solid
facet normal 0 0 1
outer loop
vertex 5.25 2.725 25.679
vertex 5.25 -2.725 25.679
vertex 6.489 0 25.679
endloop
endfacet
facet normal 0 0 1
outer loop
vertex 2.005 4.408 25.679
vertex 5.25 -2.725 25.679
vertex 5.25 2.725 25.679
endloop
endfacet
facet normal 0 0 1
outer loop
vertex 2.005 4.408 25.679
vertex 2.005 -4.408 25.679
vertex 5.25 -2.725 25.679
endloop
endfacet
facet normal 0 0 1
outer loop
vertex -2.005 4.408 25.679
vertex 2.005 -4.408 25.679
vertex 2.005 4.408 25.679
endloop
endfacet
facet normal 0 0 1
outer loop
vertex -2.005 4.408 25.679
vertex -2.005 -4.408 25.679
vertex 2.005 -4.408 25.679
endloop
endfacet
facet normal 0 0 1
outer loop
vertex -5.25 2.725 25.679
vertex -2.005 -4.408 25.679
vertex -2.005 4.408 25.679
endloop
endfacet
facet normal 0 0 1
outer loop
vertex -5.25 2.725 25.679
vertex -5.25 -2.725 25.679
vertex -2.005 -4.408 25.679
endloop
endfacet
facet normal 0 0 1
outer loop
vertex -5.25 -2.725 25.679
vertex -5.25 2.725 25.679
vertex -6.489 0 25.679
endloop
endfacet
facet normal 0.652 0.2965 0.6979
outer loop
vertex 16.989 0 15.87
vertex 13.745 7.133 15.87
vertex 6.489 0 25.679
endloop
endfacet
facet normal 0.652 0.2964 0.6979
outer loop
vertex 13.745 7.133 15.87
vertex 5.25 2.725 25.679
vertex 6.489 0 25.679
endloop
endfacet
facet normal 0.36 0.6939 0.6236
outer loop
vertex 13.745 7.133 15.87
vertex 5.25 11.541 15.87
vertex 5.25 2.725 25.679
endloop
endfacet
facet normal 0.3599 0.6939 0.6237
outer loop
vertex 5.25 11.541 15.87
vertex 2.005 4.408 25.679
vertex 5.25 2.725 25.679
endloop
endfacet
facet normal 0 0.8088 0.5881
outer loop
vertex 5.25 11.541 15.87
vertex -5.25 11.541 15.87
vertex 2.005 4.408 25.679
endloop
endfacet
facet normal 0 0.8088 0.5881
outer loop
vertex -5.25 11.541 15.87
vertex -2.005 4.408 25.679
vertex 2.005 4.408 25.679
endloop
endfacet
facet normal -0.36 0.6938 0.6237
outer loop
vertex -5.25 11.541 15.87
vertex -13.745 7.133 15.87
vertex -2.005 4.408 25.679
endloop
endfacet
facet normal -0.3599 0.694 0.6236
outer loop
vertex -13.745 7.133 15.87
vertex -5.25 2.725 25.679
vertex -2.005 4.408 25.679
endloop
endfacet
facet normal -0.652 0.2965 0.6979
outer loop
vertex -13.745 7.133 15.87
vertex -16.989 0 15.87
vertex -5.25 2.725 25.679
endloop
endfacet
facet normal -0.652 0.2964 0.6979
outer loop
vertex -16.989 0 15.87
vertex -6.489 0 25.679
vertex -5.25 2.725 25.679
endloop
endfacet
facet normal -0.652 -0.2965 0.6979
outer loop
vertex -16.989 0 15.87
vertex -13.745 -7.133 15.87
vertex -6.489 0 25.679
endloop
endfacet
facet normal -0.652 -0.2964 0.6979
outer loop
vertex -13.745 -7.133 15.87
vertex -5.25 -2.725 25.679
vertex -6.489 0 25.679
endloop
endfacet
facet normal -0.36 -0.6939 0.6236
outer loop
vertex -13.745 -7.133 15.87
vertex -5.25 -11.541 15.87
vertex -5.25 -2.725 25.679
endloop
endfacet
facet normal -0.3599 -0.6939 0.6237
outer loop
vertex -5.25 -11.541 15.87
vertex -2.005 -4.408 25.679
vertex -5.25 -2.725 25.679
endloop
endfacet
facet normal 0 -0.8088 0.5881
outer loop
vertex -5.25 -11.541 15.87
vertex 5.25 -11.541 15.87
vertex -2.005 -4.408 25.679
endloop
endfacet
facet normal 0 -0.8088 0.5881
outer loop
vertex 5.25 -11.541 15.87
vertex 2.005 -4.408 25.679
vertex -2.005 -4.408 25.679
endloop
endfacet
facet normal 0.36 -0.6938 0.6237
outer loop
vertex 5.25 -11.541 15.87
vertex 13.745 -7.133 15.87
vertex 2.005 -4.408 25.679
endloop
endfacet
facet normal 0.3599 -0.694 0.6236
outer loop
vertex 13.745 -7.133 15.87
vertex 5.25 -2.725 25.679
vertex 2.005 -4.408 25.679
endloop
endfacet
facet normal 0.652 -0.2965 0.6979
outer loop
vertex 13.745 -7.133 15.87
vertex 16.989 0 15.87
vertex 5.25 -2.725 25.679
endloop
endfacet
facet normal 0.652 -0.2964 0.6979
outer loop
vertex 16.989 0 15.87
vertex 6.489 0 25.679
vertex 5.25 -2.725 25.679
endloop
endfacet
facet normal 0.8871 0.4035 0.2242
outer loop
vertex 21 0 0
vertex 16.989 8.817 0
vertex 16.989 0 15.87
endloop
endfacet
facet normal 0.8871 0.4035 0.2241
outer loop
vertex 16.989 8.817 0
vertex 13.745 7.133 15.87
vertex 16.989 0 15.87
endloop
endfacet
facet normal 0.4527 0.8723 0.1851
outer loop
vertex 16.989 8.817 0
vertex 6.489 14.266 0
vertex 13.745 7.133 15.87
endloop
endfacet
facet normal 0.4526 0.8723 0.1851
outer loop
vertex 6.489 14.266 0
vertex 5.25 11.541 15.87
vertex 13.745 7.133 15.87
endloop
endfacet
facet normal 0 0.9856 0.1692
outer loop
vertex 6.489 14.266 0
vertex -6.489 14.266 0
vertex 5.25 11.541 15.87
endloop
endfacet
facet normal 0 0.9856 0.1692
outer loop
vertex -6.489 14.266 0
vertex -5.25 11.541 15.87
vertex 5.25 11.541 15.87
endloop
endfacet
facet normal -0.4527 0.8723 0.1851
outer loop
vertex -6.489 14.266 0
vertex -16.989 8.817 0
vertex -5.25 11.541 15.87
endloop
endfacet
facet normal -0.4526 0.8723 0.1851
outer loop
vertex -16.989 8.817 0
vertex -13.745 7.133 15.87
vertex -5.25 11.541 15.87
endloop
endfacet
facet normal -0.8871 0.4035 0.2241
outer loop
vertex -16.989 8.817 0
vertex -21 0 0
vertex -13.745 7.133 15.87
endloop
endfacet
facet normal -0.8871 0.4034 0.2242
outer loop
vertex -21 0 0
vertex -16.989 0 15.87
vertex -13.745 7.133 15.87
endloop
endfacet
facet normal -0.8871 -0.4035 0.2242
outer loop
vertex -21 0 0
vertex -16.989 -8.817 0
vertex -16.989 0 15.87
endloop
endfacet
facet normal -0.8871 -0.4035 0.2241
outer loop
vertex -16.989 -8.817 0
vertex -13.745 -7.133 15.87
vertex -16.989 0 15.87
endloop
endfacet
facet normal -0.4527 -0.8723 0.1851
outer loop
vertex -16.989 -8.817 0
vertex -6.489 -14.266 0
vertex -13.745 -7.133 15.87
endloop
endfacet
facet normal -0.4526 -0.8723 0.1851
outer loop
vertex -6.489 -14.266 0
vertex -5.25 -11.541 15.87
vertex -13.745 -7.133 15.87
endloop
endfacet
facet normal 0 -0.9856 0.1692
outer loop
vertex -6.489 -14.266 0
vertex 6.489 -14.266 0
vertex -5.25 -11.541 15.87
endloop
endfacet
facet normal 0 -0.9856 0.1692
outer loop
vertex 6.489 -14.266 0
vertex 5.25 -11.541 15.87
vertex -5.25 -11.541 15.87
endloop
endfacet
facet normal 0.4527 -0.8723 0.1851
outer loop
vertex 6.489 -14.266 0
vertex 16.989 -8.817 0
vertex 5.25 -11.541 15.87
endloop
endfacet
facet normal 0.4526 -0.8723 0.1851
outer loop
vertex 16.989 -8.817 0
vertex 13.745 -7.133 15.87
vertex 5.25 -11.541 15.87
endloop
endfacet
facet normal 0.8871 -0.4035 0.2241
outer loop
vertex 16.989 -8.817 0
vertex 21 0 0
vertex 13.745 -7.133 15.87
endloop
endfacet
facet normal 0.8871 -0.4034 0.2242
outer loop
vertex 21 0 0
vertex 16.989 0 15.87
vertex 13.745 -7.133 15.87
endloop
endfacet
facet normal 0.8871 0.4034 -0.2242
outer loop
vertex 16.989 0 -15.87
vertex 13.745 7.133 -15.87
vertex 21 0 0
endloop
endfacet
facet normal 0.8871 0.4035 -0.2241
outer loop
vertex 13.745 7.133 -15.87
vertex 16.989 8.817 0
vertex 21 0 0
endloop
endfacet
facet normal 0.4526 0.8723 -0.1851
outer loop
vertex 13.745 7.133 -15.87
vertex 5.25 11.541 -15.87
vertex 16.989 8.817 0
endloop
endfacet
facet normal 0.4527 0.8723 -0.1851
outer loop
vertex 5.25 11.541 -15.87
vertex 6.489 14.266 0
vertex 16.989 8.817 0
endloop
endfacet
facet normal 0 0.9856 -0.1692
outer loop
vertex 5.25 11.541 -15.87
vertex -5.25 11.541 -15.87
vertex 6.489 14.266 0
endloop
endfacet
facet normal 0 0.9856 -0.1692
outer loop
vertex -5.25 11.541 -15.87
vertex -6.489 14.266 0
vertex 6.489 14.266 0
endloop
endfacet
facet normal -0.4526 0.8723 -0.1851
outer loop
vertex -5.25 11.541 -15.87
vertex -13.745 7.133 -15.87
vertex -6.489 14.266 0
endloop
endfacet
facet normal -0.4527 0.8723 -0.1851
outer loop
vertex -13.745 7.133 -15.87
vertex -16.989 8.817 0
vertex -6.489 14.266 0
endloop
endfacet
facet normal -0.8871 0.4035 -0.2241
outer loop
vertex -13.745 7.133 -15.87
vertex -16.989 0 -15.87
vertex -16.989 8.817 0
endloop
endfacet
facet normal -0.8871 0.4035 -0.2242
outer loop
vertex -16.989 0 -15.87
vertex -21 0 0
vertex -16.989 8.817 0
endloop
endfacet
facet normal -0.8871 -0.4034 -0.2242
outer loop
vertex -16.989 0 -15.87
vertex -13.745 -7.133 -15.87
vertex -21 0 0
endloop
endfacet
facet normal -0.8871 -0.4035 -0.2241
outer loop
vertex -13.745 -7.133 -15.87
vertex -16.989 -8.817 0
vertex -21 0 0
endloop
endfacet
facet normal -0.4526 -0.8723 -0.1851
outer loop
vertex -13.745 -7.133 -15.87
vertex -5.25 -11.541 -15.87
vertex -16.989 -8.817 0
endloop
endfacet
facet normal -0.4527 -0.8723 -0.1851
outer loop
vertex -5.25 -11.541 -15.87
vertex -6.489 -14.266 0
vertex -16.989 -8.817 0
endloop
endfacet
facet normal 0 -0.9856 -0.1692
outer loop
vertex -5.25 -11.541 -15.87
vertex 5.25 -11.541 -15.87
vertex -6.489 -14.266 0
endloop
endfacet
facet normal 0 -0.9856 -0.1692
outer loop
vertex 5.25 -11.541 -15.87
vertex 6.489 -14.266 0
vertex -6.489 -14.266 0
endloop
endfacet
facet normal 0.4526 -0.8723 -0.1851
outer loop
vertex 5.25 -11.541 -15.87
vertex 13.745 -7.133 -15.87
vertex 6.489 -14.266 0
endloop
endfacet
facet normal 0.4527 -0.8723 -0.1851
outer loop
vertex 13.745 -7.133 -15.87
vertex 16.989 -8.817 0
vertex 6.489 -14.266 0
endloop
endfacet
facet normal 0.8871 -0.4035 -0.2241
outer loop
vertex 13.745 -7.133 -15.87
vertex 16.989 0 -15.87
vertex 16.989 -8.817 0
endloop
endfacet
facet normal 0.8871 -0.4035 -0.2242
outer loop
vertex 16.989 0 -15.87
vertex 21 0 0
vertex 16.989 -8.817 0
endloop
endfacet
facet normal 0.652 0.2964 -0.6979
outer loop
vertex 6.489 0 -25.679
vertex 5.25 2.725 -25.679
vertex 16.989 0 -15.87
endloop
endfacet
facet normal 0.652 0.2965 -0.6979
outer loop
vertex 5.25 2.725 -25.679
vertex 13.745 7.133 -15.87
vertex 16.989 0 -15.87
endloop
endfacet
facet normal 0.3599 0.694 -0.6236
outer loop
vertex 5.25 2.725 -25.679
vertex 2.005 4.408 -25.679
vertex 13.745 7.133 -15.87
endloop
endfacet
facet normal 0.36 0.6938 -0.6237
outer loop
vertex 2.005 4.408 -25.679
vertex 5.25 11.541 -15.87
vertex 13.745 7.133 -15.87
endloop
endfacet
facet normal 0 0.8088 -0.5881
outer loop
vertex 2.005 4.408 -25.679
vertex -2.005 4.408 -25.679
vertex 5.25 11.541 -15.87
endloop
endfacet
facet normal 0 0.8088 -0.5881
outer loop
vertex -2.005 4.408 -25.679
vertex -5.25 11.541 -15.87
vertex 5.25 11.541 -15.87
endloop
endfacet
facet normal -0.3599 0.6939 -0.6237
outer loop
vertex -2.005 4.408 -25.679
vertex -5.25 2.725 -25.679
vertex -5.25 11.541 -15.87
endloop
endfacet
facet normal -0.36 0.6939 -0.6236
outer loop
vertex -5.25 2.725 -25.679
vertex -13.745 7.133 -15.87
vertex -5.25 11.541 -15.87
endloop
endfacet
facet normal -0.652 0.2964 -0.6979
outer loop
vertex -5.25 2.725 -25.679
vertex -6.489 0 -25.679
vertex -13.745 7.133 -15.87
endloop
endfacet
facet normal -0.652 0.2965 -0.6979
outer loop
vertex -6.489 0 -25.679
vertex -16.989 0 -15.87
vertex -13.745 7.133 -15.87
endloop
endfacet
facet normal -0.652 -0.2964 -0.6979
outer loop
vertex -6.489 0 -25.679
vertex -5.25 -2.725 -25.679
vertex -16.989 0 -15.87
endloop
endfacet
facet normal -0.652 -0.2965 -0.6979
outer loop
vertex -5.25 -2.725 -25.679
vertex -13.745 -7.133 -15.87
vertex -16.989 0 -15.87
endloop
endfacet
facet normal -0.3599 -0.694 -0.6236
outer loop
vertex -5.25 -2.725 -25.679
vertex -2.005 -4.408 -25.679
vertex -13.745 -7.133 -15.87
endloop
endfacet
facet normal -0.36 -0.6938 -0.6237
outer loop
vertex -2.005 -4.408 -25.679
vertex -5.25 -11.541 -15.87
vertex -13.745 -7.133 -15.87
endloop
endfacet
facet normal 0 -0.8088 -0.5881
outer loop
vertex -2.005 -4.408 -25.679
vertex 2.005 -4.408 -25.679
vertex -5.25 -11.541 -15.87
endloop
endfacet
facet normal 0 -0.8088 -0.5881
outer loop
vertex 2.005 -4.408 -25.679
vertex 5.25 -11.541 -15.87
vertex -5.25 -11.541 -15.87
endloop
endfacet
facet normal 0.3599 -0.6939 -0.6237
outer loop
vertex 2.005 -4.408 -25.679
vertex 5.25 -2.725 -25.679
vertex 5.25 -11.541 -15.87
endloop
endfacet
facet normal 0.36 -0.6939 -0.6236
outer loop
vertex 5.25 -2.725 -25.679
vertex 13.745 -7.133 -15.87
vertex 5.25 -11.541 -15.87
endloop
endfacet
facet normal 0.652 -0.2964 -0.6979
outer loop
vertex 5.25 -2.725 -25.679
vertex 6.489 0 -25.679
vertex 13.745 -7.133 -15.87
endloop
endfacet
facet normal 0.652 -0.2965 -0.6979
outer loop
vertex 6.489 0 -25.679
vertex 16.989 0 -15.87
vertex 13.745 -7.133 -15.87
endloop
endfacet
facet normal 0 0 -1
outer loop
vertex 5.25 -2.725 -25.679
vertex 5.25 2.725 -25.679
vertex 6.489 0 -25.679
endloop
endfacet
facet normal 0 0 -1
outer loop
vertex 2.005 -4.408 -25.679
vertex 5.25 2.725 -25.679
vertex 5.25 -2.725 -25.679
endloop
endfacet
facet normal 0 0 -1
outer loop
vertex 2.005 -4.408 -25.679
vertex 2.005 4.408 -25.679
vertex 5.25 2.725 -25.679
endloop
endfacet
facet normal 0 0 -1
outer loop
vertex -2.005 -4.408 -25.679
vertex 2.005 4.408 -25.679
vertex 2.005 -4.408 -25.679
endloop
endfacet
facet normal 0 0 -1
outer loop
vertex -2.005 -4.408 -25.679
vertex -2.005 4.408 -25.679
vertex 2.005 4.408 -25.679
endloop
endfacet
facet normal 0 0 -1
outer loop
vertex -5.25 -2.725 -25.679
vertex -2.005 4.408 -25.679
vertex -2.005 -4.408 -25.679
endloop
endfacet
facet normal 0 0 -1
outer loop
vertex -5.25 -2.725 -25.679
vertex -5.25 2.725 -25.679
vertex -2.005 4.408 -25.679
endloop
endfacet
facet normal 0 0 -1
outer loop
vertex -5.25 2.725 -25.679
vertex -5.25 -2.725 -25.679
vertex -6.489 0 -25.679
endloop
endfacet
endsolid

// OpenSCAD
// Generated by SolidPython 1.0.1 on 2020-07-29 00:46:47


scale(v = [7, 5, 9]) {
	sphere(r = 3);
}
/***********************************************
*********      SolidPython code:      **********
************************************************
 
# import packages: SolidPython
from solid import *
from solid.utils import *
from itertools import chain, combinations, permutations


class Resize:

    def __init__(self, scad_file):
        self.scad_file = scad_file
        #self.scad_file = import_scad(scad_file)
        # cone/cylinder param:
        self.r1 = 0
        self.r2 = 0
        self.h = 0
        # rectangular prism param:
        self.w = 0
        self.l = 0
        # ellipse param:
        self.r = 0

    # import OpenScad code (file name corresponds to shape)


    # classify shape + parameters
    def assign(self, param1, param2, param3):
        if self.scad_file == 'cone.scad':
            self.r1 = param1
            self.r2 = param2
            self.h = param3
        elif self.scad_file == 'cylinder.scad':
            self.r1 = param1
            self.r2 = param2
            self.h = param3
        elif self.scad_file == 'rectangularPrism.scad':
            self.h = param1
            self.l = param2
            self.w = param3
        else:
            self.r = param1
            self.h = param2

    # resize parameters
    def iterate(self):
        x = range(3, 20, 2)
        i = 1
        if self.scad_file == 'cone.scad':
            tempList = list(permutations(x, 2))
            for temp in tempList:
                param1 = temp[0]
                param2 = temp[1]
                filepath = 'produced_scad_files/' + 'cone' + str(param1) + '_' + str(param2) + '_' + '.scad'
                scad_render_to_file(cylinder(h=param1, r1=param2, r2=0), filepath)

        elif self.scad_file == 'cylinder.scad':
            tempList = list(permutations(x, 3))
            for temp in tempList:
                param1 = temp[0]
                param2 = temp[1]
                filepath = 'produced_scad_files/' + 'cylinder' + str(param1) + '_' + str(param2) + '_' + '.scad'
                scad_render_to_file(cylinder(h=param1, r1=param2, r2=param2), filepath)

        elif self.scad_file == 'rectangularPrism.scad':
            tempList = list(permutations(x, 3))
            for temp in tempList:
                param1 = temp[0]
                param2 = temp[1]
                param3 = temp[2]
                filepath = 'produced_scad_files/' + 'rectangularPrism' + str(param1) + '_' + str(param2) + '_' + str(
                    param3) + '.scad'
                scad_render_to_file(cube(size=(param1, param2, param3)), filepath)

        elif self.scad_file == 'ellipse.scad':
            tempList = list(permutations(x, 4))
            for temp in tempList:
                param1 = temp[0]
                param2 = temp[1]
                param3 = temp[2]
                param4 = temp[3]
                filepath = 'produced_scad_files/' + 'ellipse' + str(param1) + '_' + str(param2) + '_' + str(param3) + '_' + str(param4) + '.scad'
                scad_render_to_file(scale([param1, param2, param3])(sphere(r=param4)), filepath)

    def render_to_scadfile(self):
        scad_render_to_file(scad, 'example.scad') 
 
************************************************/
